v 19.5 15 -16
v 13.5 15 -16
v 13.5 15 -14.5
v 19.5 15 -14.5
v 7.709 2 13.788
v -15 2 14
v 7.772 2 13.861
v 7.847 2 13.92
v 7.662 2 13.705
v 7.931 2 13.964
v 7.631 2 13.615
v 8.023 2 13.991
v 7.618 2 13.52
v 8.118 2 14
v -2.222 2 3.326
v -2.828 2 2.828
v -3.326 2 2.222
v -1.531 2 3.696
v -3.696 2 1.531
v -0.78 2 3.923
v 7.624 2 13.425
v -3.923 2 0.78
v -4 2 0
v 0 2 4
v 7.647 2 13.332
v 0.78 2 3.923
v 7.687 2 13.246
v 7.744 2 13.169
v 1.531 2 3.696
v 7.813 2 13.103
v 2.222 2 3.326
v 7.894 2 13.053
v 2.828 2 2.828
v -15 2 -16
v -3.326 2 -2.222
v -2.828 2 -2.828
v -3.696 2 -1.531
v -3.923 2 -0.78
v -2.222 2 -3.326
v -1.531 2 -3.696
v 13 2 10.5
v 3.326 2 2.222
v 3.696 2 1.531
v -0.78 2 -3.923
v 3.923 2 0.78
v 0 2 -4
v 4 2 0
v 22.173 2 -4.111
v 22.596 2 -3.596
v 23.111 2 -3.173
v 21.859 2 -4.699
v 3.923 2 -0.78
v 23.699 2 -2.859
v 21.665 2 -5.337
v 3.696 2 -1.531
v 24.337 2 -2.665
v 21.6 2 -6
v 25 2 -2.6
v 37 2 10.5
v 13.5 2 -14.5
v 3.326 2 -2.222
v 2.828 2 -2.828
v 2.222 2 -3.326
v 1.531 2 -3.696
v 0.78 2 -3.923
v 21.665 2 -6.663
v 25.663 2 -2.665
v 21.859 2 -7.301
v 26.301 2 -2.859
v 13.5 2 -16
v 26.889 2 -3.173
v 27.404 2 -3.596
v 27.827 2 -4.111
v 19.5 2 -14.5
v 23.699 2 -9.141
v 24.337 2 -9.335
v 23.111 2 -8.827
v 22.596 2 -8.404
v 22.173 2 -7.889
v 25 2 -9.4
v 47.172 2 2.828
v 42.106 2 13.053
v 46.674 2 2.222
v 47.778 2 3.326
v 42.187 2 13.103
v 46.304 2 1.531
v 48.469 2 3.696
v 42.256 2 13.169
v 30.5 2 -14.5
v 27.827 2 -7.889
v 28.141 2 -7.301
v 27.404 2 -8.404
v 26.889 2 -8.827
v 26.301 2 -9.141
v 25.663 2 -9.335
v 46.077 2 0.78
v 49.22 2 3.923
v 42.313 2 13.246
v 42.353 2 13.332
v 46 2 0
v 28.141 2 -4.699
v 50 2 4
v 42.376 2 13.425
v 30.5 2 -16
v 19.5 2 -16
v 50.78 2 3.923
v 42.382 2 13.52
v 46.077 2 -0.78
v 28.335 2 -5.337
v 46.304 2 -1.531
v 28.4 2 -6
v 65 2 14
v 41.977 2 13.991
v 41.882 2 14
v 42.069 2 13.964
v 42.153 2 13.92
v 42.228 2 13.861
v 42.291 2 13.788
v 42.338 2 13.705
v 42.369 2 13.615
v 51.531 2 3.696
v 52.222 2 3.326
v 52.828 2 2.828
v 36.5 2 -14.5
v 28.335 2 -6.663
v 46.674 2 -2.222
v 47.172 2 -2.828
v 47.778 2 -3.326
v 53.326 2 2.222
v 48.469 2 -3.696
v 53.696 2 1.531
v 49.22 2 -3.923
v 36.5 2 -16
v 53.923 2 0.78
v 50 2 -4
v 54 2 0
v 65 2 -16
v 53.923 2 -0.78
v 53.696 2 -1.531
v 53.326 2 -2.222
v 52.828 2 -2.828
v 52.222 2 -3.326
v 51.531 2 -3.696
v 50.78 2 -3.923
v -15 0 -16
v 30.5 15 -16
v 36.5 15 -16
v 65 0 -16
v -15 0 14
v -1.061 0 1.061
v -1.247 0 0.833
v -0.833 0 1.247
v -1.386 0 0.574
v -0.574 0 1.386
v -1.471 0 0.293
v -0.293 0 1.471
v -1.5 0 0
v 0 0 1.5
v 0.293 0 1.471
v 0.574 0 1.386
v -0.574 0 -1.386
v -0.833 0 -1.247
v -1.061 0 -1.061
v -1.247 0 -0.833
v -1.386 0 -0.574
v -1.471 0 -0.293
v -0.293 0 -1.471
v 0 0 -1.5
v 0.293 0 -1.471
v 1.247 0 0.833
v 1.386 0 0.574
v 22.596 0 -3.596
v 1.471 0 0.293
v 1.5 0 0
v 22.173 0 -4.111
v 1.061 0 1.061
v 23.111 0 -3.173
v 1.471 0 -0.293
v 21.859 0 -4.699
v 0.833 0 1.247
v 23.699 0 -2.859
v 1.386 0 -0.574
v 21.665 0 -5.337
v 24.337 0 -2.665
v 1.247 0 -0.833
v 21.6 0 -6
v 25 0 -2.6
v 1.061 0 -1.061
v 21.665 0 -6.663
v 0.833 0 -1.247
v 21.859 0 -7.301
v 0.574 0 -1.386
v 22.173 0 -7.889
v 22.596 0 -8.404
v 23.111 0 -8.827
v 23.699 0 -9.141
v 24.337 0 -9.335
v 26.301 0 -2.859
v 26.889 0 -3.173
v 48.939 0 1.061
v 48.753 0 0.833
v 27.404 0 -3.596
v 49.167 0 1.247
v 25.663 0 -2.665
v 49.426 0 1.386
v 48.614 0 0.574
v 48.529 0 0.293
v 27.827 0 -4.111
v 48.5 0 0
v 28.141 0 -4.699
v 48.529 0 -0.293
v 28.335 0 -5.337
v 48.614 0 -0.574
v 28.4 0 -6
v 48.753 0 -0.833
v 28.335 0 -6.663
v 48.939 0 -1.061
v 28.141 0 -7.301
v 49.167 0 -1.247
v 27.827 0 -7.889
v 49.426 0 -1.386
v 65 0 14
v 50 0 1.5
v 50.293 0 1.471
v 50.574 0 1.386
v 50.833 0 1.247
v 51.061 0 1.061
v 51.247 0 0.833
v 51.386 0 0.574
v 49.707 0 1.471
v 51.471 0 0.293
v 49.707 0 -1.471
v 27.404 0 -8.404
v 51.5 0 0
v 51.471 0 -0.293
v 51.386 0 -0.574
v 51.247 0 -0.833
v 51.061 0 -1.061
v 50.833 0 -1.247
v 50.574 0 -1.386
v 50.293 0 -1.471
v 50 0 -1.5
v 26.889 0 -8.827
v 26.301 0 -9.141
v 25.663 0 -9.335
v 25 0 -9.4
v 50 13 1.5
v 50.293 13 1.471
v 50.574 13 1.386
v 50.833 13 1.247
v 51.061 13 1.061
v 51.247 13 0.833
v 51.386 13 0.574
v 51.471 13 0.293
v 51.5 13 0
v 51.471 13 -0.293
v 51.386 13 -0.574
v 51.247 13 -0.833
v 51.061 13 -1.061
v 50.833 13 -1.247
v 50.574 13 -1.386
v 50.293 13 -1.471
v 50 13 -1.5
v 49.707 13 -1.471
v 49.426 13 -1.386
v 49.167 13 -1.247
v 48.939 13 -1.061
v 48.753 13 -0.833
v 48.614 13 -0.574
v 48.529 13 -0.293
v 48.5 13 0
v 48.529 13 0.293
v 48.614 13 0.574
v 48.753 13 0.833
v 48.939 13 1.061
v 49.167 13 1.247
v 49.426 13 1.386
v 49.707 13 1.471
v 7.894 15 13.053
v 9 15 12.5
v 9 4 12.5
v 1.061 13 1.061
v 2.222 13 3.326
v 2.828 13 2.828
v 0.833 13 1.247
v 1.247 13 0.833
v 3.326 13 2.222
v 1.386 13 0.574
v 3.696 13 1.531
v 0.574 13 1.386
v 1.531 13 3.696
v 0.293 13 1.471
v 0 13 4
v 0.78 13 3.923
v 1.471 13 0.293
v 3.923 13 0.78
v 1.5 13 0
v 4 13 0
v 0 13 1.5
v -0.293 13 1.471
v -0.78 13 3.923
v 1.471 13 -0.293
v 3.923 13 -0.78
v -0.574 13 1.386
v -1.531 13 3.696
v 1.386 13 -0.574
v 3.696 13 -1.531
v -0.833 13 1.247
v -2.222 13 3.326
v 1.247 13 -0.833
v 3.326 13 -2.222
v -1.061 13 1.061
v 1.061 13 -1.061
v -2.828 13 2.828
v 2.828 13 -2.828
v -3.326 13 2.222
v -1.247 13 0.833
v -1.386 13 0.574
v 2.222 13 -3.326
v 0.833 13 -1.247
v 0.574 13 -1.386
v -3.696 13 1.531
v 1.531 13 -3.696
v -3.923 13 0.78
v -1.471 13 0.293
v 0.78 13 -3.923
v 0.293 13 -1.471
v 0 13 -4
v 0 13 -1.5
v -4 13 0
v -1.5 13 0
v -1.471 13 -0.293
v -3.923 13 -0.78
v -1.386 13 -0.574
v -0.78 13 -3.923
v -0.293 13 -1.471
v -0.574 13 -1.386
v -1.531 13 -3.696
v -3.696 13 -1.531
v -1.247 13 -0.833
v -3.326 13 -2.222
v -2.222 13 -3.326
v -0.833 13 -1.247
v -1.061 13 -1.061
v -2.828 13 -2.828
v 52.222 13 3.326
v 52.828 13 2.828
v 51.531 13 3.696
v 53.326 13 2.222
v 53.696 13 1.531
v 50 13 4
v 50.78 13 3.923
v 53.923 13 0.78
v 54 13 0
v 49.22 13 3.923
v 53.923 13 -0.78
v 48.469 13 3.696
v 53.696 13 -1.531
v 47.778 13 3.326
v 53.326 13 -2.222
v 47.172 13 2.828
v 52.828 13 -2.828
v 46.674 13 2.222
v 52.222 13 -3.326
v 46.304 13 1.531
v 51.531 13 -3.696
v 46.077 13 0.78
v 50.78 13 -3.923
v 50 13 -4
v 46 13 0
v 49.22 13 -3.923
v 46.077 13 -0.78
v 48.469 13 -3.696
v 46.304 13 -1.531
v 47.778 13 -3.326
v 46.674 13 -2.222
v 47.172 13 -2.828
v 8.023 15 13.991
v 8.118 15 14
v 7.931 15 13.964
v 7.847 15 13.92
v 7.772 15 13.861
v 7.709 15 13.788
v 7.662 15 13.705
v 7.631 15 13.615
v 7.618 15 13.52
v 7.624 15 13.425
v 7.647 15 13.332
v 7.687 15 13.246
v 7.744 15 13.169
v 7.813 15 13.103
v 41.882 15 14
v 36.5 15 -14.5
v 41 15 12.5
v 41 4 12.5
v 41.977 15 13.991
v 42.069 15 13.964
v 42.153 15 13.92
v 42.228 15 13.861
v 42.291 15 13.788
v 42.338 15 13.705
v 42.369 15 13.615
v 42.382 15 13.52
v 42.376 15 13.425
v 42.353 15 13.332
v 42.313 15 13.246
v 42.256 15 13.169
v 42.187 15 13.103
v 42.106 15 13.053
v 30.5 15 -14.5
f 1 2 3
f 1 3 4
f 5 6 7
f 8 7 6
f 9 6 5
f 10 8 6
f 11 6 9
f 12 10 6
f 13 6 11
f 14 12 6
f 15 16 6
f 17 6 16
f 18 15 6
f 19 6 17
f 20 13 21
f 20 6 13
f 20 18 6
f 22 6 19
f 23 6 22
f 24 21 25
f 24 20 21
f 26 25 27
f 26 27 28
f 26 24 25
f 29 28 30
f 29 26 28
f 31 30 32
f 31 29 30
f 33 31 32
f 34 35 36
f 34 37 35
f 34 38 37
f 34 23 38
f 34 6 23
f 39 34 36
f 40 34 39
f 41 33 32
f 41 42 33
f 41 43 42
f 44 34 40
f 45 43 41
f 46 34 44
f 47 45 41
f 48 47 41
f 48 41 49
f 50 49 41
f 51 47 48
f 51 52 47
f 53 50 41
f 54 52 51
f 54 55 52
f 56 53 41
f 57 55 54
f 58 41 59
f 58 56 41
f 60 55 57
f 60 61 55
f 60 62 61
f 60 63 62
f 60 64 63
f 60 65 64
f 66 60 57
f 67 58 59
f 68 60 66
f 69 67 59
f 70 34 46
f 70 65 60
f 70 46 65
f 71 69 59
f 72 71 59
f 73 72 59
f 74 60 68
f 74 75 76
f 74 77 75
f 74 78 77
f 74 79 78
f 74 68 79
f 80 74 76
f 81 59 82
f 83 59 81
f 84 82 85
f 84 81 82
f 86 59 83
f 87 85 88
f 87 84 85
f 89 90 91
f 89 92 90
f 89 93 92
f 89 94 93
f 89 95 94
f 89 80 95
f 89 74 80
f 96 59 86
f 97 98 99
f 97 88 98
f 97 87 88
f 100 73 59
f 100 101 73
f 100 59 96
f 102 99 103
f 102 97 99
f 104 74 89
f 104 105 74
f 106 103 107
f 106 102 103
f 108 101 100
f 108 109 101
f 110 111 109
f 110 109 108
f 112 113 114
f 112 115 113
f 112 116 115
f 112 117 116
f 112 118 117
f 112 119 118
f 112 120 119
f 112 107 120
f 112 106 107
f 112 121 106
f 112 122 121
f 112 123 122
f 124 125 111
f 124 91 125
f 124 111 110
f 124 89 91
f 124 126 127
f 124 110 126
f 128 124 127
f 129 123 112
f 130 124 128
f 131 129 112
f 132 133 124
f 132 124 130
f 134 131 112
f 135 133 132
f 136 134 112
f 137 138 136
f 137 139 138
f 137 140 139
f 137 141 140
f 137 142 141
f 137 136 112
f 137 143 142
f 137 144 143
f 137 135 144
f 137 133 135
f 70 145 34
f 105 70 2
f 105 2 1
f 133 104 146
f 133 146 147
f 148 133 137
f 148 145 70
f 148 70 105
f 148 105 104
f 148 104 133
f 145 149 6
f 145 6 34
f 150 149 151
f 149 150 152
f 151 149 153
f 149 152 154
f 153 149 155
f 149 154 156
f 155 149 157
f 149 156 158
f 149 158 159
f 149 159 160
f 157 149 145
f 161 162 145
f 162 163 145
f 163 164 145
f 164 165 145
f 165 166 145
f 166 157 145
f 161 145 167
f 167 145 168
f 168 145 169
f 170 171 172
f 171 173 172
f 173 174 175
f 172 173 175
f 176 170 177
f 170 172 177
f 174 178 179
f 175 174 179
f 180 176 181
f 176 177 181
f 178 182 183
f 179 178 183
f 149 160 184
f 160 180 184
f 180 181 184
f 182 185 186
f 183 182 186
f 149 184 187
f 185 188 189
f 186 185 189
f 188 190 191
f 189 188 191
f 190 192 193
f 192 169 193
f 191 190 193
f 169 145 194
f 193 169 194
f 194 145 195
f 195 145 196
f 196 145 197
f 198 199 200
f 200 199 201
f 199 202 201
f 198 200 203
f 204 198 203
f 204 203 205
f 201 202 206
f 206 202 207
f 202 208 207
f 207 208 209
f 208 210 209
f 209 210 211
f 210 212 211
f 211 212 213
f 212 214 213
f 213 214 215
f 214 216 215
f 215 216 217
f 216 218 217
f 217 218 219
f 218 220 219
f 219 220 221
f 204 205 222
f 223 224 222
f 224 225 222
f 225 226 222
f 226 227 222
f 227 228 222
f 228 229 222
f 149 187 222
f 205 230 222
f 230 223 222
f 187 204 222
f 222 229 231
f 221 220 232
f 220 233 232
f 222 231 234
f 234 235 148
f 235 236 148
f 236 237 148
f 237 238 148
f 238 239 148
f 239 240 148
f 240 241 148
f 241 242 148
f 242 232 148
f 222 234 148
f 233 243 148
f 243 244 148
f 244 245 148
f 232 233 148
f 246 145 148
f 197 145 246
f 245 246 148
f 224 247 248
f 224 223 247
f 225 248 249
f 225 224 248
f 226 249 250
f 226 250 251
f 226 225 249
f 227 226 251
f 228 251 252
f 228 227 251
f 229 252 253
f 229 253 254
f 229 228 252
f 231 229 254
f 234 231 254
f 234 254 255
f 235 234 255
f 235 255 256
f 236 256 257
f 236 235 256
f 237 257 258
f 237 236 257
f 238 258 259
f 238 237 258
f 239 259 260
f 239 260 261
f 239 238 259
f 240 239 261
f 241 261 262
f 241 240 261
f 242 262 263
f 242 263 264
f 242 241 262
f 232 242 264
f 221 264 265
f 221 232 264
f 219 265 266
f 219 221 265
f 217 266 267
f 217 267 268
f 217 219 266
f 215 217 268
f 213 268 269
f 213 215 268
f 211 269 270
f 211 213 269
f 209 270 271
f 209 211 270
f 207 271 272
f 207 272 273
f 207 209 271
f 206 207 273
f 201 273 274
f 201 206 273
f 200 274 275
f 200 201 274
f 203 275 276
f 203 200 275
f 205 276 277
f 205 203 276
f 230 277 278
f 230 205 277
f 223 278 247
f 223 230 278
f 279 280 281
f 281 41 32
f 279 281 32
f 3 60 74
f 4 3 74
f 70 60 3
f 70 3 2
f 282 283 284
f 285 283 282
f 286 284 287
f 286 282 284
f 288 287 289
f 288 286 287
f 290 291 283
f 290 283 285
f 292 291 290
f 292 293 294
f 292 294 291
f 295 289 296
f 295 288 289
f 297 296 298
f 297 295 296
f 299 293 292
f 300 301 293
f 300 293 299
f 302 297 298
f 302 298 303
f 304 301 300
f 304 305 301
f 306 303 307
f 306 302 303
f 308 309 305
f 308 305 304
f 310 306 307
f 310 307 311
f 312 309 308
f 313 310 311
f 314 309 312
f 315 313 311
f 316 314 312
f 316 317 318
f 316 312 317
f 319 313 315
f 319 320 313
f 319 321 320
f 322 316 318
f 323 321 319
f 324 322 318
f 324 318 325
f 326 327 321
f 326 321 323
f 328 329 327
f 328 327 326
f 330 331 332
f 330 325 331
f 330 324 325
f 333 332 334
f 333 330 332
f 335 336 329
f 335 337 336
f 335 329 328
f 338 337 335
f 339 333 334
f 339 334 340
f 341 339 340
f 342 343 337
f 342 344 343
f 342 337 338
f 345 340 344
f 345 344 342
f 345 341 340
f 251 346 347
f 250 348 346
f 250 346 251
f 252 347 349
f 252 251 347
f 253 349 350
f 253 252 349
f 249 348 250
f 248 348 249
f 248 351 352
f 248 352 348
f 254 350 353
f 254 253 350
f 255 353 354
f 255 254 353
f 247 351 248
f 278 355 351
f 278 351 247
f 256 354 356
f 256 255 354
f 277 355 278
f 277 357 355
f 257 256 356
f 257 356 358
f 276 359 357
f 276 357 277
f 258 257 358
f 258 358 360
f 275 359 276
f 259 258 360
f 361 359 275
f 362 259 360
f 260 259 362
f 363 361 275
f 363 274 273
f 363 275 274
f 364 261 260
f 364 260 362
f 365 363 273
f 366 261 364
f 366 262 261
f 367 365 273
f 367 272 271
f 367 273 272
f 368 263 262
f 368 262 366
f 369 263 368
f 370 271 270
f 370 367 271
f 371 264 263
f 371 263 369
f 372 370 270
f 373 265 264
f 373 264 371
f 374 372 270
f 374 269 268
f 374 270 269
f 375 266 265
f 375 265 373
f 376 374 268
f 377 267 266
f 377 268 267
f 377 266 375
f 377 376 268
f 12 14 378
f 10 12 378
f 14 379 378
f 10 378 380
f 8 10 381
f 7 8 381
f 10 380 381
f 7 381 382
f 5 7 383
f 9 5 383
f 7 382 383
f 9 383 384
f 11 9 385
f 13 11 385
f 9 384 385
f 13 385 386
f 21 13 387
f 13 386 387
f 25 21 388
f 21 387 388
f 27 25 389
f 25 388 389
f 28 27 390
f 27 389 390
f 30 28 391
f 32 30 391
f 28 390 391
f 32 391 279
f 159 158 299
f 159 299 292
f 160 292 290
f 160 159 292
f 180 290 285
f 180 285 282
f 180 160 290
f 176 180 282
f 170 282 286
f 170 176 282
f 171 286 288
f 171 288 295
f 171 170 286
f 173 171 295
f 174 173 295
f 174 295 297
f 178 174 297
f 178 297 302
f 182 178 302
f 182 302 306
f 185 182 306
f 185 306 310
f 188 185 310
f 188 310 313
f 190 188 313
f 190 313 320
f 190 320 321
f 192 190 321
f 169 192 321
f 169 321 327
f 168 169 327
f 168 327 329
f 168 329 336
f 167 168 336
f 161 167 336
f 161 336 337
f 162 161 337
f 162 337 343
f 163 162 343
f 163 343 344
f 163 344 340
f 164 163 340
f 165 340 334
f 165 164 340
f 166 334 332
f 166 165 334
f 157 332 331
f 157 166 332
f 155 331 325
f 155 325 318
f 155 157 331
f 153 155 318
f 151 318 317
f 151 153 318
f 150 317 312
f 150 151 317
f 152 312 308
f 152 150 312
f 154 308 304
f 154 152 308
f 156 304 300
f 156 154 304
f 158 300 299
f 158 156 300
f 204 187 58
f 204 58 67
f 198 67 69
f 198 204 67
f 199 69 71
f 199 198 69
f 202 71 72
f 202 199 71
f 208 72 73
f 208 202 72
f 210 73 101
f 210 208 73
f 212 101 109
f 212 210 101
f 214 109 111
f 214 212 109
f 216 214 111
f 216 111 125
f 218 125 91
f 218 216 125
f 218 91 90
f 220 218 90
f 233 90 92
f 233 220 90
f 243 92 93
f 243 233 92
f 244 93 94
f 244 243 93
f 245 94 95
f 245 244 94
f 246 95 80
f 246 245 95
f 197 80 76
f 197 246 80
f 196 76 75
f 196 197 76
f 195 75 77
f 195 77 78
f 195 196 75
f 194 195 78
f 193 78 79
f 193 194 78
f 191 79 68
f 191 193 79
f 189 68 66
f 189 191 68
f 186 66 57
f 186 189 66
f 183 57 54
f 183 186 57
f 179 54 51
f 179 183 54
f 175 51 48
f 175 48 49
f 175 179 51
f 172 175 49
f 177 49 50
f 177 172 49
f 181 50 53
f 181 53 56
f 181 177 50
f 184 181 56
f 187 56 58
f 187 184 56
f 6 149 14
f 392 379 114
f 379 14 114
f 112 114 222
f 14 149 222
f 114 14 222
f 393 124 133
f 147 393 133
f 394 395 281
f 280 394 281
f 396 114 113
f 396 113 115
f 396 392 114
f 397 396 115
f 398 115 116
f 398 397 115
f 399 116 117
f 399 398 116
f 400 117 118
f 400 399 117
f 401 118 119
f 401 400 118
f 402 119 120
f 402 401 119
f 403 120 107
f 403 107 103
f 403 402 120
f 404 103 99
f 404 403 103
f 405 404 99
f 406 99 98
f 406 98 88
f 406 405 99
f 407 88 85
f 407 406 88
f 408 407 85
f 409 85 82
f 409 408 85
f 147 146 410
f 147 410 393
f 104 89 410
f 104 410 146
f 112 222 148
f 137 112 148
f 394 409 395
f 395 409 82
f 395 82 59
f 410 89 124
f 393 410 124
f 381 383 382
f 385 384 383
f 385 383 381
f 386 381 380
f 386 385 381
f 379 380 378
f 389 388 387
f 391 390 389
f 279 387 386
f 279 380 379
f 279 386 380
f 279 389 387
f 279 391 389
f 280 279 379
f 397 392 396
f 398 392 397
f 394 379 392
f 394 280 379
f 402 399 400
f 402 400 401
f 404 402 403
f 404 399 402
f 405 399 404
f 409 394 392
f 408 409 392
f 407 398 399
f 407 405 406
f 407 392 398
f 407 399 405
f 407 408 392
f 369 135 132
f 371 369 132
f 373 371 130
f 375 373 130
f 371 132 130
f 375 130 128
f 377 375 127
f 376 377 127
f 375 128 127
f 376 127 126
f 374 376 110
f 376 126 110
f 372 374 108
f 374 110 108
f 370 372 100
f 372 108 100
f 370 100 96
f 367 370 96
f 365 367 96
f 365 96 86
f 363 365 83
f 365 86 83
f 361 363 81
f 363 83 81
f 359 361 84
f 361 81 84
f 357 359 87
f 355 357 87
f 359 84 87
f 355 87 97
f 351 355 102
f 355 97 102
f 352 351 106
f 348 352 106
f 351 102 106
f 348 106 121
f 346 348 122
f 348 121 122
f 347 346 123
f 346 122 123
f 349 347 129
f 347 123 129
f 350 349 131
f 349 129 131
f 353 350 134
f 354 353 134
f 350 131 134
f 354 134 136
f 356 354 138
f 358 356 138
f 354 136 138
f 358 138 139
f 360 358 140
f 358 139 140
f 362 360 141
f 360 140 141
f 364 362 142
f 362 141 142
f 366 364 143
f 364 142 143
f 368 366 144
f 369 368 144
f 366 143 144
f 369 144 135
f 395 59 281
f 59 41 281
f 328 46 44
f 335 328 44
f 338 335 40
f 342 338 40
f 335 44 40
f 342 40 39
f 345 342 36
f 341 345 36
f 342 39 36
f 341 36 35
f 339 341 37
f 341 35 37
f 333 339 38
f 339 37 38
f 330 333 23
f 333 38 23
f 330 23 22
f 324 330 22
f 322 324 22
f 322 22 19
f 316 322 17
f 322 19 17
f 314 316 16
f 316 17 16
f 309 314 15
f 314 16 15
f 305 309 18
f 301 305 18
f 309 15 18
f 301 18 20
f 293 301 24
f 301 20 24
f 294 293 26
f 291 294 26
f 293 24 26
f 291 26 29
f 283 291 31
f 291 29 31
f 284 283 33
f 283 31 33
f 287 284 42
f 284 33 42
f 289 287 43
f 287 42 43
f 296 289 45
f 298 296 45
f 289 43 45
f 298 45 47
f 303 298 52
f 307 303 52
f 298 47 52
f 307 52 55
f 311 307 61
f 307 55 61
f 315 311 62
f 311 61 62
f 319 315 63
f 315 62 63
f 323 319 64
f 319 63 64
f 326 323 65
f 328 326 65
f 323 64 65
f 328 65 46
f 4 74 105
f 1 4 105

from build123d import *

# Parameters (mm, degrees)
SKETCH2_W           = 80
SKETCH2_H           = 30
SKETCH2_R           = 1.5
SKETCH2_R_2         = 3.4
BOSS_EXTRUDE1_DEPTH = 2
SKETCH3_W           = 6
SKETCH3_H           = 1.5
BOSS_EXTRUDE2_DEPTH = 13
SKETCH9_R           = 4
SKETCH9_R_2         = 1.5
BOSS_EXTRUDE4_DEPTH = 11
FILLET1_R           = 0.5
CHAMFER1_SIZE       = 2


with BuildPart() as part:
    # Sketch2 → Boss-Extrude1 (new body)
    with BuildSketch(Plane(origin=(0, 0, 0), x_dir=(1, 0, 0), z_dir=(0, 1, 0))):
        with Locations((25, 1)):
            Rectangle(SKETCH2_W, SKETCH2_H)
        with Locations(Location((0, 0, 0), (0, 0, 270))):  # turned: the seam where the file's is
            Circle(SKETCH2_R, mode=Mode.SUBTRACT)
        with Locations(Location((50, 0, 0), (0, 0, 270))):  # turned: the seam where the file's is
            Circle(SKETCH2_R, mode=Mode.SUBTRACT)
        with Locations(Location((25, 6, 0), (0, 0, 270))):  # turned: the seam where the file's is
            Circle(SKETCH2_R_2, mode=Mode.SUBTRACT)
    extrude(amount=BOSS_EXTRUDE1_DEPTH)

    # Sketch3 → Boss-Extrude2 (add)
    with BuildSketch(Plane(origin=(0, 2, 0), x_dir=(1, 0, 0), z_dir=(0, 1, 0))):
        Polygon((6, -14), (44, -14), (41, -12.5), (9, -12.5), align=None)
        with Locations((16.5, 15.25)):
            Rectangle(SKETCH3_W, SKETCH3_H)
        with Locations((33.5, 15.25)):
            Rectangle(SKETCH3_W, SKETCH3_H)
    extrude(amount=BOSS_EXTRUDE2_DEPTH)

    # Sketch9 → Boss-Extrude4 (add)
    with BuildSketch(Plane(origin=(0, 2, 0), x_dir=(1, 0, 0), z_dir=(0, 1, 0))):
        with Locations(Location((50, 0, 0), (0, 0, 90))):  # turned: the seam where the file's is
            Circle(SKETCH9_R)
        with Locations(Location((50, 0, 0), (0, 0, 270))):  # turned: the seam where the file's is
            Circle(SKETCH9_R_2, mode=Mode.SUBTRACT)
        with Locations(Location((0, 0, 0), (0, 0, 90))):  # turned: the seam where the file's is
            Circle(SKETCH9_R)
        with Locations(Location((0, 0, 0), (0, 0, 270))):  # turned: the seam where the file's is
            Circle(SKETCH9_R_2, mode=Mode.SUBTRACT)
    extrude(amount=BOSS_EXTRUDE4_DEPTH)

    # Fillet1
    fillet1_edges = [part.edges().sort_by_distance(p)[0] for p in [
        (6, 8.5, 14),
        (44, 8.5, 14),
    ]]
    fillet(fillet1_edges, radius=FILLET1_R)

    # Chamfer1
    chamfer1_edges = [part.edges().sort_by_distance(p)[0] for p in [
        (25, 2, 12.5),
    ]]
    chamfer(chamfer1_edges, length=CHAMFER1_SIZE)


solid = part.part
